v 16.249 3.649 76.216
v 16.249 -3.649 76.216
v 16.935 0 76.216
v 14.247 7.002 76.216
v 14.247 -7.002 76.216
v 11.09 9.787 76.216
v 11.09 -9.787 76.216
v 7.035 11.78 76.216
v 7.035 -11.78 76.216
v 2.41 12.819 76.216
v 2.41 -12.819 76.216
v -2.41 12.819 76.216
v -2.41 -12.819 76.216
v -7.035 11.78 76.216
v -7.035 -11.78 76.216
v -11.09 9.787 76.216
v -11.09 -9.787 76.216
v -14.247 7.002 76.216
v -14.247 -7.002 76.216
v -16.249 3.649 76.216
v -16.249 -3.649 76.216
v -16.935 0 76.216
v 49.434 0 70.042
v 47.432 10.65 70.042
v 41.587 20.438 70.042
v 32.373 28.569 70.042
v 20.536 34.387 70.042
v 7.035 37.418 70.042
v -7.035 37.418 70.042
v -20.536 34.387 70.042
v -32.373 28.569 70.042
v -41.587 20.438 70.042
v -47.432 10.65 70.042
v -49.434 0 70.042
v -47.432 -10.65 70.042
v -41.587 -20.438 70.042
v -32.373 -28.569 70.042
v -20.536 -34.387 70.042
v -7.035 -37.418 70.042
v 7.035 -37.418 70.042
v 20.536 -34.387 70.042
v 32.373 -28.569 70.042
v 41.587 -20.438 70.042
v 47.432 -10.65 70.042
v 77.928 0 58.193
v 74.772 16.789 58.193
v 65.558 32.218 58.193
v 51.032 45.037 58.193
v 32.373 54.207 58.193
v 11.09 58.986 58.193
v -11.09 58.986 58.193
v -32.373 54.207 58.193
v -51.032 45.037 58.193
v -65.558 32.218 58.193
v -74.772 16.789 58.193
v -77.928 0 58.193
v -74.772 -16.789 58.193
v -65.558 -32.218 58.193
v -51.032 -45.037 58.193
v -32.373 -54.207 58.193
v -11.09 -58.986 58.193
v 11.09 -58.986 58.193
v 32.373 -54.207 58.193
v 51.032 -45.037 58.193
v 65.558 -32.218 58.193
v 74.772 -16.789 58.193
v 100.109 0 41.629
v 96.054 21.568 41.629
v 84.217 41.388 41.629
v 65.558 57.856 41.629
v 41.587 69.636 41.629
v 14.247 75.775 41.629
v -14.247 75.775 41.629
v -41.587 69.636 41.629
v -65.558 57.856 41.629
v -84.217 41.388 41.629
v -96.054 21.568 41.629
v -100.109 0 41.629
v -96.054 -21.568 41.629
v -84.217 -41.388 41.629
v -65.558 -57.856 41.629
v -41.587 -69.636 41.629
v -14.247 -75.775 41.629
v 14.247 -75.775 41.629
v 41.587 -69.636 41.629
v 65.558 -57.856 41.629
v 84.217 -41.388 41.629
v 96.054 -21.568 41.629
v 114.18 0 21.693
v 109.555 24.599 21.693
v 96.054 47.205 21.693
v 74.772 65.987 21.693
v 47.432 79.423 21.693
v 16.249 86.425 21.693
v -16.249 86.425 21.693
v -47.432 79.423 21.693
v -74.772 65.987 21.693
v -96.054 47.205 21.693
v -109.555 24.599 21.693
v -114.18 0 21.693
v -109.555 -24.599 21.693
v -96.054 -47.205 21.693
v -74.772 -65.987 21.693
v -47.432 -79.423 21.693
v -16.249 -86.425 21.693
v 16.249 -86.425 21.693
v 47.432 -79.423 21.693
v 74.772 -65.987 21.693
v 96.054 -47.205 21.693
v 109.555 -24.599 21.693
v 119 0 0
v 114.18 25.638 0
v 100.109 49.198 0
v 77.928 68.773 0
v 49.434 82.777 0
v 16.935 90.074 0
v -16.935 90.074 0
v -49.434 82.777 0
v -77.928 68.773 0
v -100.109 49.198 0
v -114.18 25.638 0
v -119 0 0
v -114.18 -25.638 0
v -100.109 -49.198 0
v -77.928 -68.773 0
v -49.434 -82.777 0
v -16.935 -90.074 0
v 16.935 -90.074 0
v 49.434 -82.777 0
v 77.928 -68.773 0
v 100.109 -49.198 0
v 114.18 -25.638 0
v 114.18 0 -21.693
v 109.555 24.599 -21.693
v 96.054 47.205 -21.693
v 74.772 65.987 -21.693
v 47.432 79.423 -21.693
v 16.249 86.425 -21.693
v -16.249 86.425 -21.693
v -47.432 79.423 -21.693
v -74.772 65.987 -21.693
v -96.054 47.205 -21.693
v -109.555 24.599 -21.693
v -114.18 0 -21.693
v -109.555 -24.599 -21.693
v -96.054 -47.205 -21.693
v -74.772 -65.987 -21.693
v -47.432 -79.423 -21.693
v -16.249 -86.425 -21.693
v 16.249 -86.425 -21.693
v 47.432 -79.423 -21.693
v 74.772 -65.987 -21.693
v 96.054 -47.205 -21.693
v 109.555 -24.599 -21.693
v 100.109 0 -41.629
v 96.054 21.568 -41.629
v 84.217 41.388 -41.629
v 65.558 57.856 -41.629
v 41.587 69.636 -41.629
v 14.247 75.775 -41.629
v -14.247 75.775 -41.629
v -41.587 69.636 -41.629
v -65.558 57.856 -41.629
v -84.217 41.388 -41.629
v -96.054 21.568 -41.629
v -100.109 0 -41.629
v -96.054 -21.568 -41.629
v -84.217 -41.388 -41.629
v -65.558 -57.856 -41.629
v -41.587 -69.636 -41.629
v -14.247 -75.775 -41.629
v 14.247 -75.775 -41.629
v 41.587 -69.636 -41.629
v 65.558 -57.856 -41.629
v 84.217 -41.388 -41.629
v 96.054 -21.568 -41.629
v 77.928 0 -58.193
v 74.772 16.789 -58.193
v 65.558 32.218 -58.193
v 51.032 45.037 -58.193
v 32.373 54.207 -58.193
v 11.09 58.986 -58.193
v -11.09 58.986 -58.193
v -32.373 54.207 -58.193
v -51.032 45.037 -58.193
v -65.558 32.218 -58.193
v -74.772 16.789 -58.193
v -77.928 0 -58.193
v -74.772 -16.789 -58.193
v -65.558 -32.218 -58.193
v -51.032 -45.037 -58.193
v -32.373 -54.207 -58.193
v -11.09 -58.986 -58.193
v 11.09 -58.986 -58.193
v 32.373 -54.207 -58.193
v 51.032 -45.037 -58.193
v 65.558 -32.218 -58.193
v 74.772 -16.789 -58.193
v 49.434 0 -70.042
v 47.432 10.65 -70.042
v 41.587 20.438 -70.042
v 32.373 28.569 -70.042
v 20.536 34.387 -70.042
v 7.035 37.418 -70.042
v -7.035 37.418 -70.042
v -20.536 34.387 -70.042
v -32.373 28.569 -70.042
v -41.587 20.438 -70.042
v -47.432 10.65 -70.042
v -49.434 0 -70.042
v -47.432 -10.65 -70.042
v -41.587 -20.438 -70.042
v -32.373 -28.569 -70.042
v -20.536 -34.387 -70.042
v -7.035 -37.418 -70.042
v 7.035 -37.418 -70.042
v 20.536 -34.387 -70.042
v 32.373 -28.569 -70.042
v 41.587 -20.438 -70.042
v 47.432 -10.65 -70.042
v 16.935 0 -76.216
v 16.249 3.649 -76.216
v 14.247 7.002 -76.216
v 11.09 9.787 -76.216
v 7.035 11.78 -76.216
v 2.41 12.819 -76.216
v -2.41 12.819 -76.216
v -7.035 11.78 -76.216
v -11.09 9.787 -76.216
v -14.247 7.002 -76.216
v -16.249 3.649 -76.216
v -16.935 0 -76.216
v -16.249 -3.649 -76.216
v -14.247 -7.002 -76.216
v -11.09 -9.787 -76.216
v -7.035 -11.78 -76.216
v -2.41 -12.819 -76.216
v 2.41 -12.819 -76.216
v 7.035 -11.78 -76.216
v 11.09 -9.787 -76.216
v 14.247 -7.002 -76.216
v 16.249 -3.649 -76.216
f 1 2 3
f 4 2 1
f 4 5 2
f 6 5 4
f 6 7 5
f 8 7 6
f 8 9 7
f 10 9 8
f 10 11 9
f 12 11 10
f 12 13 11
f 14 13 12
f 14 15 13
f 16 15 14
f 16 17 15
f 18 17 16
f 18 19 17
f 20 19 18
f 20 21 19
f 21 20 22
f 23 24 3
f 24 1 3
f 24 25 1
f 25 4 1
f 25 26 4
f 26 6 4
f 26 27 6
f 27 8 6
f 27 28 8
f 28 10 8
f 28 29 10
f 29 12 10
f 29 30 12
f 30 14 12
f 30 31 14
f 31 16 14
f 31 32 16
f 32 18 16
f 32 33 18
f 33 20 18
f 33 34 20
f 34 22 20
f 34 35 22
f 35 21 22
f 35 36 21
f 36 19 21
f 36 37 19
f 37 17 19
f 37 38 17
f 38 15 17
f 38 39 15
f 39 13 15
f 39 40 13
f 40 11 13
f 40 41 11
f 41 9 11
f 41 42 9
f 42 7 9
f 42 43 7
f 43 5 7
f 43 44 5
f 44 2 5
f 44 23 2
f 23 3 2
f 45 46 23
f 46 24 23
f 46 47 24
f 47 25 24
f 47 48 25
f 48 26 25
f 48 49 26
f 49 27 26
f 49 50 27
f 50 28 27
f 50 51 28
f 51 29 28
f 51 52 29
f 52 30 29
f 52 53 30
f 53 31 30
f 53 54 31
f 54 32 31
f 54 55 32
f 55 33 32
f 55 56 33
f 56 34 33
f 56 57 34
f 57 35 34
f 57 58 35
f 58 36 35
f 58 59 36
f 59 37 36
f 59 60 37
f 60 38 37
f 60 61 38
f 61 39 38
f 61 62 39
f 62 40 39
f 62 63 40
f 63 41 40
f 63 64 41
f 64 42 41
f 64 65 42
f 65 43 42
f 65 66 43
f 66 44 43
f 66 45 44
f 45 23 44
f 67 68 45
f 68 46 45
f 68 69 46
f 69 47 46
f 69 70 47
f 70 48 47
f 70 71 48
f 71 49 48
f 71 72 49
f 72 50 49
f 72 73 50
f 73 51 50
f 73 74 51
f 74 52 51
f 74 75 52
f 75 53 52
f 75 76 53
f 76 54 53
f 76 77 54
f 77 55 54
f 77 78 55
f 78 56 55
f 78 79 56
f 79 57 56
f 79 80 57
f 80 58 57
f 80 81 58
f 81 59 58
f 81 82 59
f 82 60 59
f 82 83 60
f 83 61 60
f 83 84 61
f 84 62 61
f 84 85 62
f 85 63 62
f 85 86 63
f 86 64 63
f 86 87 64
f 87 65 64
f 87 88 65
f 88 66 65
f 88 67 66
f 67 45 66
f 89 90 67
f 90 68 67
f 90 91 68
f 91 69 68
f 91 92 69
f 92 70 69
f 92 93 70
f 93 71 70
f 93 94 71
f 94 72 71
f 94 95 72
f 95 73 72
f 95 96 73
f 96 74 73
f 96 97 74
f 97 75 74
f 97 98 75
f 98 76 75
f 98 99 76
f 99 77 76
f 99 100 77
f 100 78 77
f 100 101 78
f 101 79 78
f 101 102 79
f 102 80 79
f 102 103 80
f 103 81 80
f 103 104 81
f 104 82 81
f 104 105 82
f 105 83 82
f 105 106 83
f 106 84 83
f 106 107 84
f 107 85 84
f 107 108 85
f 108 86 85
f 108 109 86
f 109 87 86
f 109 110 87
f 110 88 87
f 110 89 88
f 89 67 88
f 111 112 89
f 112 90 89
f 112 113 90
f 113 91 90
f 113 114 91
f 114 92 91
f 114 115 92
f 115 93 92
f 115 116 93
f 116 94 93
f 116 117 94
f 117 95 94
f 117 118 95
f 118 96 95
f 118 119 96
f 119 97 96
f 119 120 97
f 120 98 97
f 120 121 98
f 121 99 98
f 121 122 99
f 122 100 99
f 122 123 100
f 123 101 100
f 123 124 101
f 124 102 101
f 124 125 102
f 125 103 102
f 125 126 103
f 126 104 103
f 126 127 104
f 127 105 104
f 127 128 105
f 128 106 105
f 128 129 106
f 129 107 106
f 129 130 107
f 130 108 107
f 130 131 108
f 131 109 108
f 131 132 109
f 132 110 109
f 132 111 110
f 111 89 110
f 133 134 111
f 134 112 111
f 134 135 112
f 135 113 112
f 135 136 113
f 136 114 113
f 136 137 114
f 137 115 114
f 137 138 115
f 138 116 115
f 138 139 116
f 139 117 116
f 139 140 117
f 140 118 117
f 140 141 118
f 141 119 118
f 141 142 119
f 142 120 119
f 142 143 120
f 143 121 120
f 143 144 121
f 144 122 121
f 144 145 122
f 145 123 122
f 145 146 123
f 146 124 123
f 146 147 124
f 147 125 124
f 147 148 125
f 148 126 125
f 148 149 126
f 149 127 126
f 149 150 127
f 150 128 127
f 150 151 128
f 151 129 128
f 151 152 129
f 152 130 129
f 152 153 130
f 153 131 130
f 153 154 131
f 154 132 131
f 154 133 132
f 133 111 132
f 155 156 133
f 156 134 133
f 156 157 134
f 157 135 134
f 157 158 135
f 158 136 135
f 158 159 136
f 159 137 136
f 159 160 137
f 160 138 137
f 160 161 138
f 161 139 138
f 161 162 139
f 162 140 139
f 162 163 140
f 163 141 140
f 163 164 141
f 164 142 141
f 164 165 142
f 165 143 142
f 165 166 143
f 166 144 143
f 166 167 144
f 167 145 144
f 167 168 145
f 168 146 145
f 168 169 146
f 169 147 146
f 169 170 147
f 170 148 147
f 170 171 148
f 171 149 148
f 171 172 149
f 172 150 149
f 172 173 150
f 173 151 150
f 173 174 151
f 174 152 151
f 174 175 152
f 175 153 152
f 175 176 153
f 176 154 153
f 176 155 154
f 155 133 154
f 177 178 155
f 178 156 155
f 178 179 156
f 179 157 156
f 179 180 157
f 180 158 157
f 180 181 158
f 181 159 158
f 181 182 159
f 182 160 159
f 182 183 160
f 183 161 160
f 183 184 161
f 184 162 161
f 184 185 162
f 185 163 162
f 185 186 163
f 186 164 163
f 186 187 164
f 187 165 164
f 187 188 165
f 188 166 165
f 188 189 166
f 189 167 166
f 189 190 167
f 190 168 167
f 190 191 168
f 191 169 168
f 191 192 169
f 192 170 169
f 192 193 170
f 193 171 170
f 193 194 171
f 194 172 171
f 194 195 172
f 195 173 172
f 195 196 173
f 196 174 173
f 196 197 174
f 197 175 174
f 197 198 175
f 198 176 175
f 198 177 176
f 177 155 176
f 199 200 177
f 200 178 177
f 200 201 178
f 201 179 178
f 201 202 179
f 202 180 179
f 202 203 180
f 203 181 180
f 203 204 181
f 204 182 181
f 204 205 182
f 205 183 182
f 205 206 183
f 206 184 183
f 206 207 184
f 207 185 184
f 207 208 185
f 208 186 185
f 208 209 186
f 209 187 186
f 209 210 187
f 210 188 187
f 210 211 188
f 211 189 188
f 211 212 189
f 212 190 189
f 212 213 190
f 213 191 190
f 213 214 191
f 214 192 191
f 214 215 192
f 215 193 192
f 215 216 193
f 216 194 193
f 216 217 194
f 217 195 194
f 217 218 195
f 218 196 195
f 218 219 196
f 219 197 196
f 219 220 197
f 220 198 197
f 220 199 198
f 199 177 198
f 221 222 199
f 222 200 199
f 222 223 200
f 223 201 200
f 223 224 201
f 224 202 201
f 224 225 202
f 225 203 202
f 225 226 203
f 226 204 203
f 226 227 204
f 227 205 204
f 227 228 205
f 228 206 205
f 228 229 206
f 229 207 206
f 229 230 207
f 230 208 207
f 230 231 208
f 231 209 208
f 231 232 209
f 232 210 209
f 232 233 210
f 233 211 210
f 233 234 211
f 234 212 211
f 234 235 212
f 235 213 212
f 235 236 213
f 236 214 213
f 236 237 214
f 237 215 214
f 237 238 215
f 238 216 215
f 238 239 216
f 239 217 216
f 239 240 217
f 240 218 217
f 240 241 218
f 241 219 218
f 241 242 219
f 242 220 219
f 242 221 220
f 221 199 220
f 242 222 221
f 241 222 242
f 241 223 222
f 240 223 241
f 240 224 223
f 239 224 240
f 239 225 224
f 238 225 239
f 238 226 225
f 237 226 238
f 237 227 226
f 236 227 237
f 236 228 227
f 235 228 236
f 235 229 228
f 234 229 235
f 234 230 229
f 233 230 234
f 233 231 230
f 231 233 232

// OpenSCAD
// Generated by SolidPython 1.0.1 on 2020-07-29 00:46:53


scale(v = [17, 13, 11]) {
	sphere(r = 7);
}
/***********************************************
*********      SolidPython code:      **********
************************************************
 
# import packages: SolidPython
from solid import *
from solid.utils import *
from itertools import chain, combinations, permutations


class Resize:

    def __init__(self, scad_file):
        self.scad_file = scad_file
        #self.scad_file = import_scad(scad_file)
        # cone/cylinder param:
        self.r1 = 0
        self.r2 = 0
        self.h = 0
        # rectangular prism param:
        self.w = 0
        self.l = 0
        # ellipse param:
        self.r = 0

    # import OpenScad code (file name corresponds to shape)


    # classify shape + parameters
    def assign(self, param1, param2, param3):
        if self.scad_file == 'cone.scad':
            self.r1 = param1
            self.r2 = param2
            self.h = param3
        elif self.scad_file == 'cylinder.scad':
            self.r1 = param1
            self.r2 = param2
            self.h = param3
        elif self.scad_file == 'rectangularPrism.scad':
            self.h = param1
            self.l = param2
            self.w = param3
        else:
            self.r = param1
            self.h = param2

    # resize parameters
    def iterate(self):
        x = range(3, 20, 2)
        i = 1
        if self.scad_file == 'cone.scad':
            tempList = list(permutations(x, 2))
            for temp in tempList:
                param1 = temp[0]
                param2 = temp[1]
                filepath = 'produced_scad_files/' + 'cone' + str(param1) + '_' + str(param2) + '_' + '.scad'
                scad_render_to_file(cylinder(h=param1, r1=param2, r2=0), filepath)

        elif self.scad_file == 'cylinder.scad':
            tempList = list(permutations(x, 3))
            for temp in tempList:
                param1 = temp[0]
                param2 = temp[1]
                filepath = 'produced_scad_files/' + 'cylinder' + str(param1) + '_' + str(param2) + '_' + '.scad'
                scad_render_to_file(cylinder(h=param1, r1=param2, r2=param2), filepath)

        elif self.scad_file == 'rectangularPrism.scad':
            tempList = list(permutations(x, 3))
            for temp in tempList:
                param1 = temp[0]
                param2 = temp[1]
                param3 = temp[2]
                filepath = 'produced_scad_files/' + 'rectangularPrism' + str(param1) + '_' + str(param2) + '_' + str(
                    param3) + '.scad'
                scad_render_to_file(cube(size=(param1, param2, param3)), filepath)

        elif self.scad_file == 'ellipse.scad':
            tempList = list(permutations(x, 4))
            for temp in tempList:
                param1 = temp[0]
                param2 = temp[1]
                param3 = temp[2]
                param4 = temp[3]
                filepath = 'produced_scad_files/' + 'ellipse' + str(param1) + '_' + str(param2) + '_' + str(param3) + '_' + str(param4) + '.scad'
                scad_render_to_file(scale([param1, param2, param3])(sphere(r=param4)), filepath)

    def render_to_scadfile(self):
        scad_render_to_file(scad, 'example.scad') 
 
************************************************/
